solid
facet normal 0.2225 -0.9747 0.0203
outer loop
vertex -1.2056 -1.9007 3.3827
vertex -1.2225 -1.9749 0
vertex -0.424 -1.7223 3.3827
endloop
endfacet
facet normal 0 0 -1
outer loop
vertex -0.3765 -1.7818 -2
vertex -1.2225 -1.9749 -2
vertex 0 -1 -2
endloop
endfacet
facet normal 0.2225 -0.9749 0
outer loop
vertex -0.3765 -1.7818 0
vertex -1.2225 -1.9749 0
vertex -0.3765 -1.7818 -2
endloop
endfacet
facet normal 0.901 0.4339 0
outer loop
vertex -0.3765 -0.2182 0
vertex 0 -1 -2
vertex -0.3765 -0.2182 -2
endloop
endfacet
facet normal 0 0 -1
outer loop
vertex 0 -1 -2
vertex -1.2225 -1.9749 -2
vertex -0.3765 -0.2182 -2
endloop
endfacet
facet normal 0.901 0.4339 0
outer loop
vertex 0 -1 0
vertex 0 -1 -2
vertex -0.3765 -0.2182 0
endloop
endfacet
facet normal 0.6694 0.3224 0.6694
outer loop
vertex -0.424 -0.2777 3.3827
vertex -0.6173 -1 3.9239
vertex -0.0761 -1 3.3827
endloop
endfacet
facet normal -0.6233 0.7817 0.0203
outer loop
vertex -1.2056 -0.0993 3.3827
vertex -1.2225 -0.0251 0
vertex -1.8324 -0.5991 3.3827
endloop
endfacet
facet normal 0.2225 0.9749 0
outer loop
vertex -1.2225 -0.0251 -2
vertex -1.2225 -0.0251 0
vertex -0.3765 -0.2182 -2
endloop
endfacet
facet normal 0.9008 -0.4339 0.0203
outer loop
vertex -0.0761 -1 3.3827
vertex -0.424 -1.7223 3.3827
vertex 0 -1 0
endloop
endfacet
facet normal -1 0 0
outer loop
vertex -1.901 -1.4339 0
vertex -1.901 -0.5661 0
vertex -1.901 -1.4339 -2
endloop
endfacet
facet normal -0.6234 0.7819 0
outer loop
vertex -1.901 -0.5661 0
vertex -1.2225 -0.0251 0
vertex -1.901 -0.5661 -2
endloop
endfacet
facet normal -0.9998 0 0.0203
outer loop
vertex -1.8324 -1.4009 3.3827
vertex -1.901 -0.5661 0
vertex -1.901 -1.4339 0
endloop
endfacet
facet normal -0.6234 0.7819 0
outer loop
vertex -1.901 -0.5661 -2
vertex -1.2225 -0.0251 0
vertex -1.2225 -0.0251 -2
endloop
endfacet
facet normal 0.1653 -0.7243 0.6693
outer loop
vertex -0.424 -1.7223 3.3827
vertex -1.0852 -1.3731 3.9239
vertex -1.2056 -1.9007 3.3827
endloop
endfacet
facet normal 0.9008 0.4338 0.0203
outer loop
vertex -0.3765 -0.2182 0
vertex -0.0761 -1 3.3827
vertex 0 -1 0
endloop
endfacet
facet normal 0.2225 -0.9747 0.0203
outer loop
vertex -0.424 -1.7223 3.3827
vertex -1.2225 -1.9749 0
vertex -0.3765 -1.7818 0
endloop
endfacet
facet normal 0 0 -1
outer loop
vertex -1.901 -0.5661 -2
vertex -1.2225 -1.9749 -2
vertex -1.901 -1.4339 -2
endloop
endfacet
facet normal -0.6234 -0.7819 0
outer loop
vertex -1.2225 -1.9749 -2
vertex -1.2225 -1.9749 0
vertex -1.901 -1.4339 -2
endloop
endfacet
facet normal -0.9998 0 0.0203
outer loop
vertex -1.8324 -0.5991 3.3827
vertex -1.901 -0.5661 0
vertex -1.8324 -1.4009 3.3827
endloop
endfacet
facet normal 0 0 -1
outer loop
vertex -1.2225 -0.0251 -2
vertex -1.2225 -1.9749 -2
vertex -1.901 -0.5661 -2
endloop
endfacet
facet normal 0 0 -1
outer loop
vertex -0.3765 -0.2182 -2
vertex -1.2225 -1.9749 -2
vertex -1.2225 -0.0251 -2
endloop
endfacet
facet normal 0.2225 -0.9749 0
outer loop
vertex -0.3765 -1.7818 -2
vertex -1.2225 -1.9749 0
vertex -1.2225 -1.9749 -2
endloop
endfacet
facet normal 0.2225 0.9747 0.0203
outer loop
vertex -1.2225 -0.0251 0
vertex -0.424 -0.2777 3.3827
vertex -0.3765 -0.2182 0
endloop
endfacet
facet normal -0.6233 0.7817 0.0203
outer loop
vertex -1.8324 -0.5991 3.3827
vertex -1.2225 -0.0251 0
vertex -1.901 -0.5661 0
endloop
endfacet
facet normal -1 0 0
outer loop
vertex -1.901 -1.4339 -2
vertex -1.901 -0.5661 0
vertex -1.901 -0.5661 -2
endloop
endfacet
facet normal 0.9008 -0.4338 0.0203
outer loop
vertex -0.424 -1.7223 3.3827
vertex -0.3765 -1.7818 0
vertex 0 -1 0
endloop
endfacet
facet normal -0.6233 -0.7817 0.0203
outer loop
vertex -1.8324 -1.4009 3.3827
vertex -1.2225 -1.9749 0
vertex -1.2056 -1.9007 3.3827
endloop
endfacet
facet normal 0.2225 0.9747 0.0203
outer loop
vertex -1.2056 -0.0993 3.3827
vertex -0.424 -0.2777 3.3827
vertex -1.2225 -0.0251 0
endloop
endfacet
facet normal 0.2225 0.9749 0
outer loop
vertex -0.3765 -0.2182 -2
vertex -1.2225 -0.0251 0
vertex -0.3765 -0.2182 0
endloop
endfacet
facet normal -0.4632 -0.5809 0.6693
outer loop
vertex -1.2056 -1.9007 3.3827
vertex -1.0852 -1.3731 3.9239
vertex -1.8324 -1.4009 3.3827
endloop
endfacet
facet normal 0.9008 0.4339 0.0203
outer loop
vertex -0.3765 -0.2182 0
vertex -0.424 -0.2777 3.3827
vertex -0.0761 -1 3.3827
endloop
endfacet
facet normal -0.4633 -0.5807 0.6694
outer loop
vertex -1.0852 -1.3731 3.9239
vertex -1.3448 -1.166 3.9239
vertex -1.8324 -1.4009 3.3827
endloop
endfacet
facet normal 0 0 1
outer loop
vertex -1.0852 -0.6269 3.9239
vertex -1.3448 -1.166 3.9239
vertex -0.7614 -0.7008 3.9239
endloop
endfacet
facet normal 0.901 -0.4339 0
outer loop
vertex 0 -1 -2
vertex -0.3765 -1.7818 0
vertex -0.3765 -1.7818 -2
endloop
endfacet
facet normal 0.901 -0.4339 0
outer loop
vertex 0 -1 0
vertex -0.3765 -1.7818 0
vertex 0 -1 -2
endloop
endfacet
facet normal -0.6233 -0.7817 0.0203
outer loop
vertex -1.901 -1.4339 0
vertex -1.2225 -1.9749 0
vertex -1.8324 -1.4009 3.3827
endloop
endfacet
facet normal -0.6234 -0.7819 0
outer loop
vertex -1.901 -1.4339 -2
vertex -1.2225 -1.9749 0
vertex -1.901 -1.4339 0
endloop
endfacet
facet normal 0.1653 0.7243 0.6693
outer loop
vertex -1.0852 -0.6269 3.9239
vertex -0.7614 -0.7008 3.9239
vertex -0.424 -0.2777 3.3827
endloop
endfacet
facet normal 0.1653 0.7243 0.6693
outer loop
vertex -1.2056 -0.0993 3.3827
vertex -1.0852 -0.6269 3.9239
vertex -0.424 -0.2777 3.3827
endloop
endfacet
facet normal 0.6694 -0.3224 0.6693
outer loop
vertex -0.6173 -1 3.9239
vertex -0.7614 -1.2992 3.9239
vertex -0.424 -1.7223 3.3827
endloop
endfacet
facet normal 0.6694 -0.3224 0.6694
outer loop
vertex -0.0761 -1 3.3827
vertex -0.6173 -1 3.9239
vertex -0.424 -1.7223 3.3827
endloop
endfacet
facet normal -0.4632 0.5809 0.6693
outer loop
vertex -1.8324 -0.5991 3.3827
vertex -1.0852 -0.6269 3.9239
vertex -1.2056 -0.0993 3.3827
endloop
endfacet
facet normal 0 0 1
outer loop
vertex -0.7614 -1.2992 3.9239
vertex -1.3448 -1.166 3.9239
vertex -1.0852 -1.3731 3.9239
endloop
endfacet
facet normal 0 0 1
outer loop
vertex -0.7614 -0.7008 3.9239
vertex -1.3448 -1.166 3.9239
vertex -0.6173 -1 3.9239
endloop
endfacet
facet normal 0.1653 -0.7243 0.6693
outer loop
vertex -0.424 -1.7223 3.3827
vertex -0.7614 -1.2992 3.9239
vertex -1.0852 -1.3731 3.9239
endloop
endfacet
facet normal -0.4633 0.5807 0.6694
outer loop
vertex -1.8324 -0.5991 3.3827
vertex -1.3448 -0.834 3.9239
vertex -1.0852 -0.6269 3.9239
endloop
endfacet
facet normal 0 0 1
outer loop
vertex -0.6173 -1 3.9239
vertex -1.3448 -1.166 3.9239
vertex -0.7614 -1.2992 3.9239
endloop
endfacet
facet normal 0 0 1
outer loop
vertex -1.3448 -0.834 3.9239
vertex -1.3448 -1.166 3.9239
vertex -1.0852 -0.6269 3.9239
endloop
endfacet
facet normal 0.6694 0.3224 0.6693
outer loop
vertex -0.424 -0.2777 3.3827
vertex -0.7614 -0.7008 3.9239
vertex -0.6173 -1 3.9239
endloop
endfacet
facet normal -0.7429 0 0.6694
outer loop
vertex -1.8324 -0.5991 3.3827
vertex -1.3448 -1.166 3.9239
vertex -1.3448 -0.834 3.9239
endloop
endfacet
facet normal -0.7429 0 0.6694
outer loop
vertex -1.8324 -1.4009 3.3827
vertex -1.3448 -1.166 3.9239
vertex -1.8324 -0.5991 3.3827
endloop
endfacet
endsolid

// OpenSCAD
$fn=7;
hull()
{
	translate([-1,-1,-2])
	{
		rotate(0,[0,0,1])
		{
			cylinder(h=2,d=2);
		}
	}
	translate([-1,-1,3])
	{
		rotate(0,[0,0,1])
		{
			sphere(d=2);
		}
	}
}
